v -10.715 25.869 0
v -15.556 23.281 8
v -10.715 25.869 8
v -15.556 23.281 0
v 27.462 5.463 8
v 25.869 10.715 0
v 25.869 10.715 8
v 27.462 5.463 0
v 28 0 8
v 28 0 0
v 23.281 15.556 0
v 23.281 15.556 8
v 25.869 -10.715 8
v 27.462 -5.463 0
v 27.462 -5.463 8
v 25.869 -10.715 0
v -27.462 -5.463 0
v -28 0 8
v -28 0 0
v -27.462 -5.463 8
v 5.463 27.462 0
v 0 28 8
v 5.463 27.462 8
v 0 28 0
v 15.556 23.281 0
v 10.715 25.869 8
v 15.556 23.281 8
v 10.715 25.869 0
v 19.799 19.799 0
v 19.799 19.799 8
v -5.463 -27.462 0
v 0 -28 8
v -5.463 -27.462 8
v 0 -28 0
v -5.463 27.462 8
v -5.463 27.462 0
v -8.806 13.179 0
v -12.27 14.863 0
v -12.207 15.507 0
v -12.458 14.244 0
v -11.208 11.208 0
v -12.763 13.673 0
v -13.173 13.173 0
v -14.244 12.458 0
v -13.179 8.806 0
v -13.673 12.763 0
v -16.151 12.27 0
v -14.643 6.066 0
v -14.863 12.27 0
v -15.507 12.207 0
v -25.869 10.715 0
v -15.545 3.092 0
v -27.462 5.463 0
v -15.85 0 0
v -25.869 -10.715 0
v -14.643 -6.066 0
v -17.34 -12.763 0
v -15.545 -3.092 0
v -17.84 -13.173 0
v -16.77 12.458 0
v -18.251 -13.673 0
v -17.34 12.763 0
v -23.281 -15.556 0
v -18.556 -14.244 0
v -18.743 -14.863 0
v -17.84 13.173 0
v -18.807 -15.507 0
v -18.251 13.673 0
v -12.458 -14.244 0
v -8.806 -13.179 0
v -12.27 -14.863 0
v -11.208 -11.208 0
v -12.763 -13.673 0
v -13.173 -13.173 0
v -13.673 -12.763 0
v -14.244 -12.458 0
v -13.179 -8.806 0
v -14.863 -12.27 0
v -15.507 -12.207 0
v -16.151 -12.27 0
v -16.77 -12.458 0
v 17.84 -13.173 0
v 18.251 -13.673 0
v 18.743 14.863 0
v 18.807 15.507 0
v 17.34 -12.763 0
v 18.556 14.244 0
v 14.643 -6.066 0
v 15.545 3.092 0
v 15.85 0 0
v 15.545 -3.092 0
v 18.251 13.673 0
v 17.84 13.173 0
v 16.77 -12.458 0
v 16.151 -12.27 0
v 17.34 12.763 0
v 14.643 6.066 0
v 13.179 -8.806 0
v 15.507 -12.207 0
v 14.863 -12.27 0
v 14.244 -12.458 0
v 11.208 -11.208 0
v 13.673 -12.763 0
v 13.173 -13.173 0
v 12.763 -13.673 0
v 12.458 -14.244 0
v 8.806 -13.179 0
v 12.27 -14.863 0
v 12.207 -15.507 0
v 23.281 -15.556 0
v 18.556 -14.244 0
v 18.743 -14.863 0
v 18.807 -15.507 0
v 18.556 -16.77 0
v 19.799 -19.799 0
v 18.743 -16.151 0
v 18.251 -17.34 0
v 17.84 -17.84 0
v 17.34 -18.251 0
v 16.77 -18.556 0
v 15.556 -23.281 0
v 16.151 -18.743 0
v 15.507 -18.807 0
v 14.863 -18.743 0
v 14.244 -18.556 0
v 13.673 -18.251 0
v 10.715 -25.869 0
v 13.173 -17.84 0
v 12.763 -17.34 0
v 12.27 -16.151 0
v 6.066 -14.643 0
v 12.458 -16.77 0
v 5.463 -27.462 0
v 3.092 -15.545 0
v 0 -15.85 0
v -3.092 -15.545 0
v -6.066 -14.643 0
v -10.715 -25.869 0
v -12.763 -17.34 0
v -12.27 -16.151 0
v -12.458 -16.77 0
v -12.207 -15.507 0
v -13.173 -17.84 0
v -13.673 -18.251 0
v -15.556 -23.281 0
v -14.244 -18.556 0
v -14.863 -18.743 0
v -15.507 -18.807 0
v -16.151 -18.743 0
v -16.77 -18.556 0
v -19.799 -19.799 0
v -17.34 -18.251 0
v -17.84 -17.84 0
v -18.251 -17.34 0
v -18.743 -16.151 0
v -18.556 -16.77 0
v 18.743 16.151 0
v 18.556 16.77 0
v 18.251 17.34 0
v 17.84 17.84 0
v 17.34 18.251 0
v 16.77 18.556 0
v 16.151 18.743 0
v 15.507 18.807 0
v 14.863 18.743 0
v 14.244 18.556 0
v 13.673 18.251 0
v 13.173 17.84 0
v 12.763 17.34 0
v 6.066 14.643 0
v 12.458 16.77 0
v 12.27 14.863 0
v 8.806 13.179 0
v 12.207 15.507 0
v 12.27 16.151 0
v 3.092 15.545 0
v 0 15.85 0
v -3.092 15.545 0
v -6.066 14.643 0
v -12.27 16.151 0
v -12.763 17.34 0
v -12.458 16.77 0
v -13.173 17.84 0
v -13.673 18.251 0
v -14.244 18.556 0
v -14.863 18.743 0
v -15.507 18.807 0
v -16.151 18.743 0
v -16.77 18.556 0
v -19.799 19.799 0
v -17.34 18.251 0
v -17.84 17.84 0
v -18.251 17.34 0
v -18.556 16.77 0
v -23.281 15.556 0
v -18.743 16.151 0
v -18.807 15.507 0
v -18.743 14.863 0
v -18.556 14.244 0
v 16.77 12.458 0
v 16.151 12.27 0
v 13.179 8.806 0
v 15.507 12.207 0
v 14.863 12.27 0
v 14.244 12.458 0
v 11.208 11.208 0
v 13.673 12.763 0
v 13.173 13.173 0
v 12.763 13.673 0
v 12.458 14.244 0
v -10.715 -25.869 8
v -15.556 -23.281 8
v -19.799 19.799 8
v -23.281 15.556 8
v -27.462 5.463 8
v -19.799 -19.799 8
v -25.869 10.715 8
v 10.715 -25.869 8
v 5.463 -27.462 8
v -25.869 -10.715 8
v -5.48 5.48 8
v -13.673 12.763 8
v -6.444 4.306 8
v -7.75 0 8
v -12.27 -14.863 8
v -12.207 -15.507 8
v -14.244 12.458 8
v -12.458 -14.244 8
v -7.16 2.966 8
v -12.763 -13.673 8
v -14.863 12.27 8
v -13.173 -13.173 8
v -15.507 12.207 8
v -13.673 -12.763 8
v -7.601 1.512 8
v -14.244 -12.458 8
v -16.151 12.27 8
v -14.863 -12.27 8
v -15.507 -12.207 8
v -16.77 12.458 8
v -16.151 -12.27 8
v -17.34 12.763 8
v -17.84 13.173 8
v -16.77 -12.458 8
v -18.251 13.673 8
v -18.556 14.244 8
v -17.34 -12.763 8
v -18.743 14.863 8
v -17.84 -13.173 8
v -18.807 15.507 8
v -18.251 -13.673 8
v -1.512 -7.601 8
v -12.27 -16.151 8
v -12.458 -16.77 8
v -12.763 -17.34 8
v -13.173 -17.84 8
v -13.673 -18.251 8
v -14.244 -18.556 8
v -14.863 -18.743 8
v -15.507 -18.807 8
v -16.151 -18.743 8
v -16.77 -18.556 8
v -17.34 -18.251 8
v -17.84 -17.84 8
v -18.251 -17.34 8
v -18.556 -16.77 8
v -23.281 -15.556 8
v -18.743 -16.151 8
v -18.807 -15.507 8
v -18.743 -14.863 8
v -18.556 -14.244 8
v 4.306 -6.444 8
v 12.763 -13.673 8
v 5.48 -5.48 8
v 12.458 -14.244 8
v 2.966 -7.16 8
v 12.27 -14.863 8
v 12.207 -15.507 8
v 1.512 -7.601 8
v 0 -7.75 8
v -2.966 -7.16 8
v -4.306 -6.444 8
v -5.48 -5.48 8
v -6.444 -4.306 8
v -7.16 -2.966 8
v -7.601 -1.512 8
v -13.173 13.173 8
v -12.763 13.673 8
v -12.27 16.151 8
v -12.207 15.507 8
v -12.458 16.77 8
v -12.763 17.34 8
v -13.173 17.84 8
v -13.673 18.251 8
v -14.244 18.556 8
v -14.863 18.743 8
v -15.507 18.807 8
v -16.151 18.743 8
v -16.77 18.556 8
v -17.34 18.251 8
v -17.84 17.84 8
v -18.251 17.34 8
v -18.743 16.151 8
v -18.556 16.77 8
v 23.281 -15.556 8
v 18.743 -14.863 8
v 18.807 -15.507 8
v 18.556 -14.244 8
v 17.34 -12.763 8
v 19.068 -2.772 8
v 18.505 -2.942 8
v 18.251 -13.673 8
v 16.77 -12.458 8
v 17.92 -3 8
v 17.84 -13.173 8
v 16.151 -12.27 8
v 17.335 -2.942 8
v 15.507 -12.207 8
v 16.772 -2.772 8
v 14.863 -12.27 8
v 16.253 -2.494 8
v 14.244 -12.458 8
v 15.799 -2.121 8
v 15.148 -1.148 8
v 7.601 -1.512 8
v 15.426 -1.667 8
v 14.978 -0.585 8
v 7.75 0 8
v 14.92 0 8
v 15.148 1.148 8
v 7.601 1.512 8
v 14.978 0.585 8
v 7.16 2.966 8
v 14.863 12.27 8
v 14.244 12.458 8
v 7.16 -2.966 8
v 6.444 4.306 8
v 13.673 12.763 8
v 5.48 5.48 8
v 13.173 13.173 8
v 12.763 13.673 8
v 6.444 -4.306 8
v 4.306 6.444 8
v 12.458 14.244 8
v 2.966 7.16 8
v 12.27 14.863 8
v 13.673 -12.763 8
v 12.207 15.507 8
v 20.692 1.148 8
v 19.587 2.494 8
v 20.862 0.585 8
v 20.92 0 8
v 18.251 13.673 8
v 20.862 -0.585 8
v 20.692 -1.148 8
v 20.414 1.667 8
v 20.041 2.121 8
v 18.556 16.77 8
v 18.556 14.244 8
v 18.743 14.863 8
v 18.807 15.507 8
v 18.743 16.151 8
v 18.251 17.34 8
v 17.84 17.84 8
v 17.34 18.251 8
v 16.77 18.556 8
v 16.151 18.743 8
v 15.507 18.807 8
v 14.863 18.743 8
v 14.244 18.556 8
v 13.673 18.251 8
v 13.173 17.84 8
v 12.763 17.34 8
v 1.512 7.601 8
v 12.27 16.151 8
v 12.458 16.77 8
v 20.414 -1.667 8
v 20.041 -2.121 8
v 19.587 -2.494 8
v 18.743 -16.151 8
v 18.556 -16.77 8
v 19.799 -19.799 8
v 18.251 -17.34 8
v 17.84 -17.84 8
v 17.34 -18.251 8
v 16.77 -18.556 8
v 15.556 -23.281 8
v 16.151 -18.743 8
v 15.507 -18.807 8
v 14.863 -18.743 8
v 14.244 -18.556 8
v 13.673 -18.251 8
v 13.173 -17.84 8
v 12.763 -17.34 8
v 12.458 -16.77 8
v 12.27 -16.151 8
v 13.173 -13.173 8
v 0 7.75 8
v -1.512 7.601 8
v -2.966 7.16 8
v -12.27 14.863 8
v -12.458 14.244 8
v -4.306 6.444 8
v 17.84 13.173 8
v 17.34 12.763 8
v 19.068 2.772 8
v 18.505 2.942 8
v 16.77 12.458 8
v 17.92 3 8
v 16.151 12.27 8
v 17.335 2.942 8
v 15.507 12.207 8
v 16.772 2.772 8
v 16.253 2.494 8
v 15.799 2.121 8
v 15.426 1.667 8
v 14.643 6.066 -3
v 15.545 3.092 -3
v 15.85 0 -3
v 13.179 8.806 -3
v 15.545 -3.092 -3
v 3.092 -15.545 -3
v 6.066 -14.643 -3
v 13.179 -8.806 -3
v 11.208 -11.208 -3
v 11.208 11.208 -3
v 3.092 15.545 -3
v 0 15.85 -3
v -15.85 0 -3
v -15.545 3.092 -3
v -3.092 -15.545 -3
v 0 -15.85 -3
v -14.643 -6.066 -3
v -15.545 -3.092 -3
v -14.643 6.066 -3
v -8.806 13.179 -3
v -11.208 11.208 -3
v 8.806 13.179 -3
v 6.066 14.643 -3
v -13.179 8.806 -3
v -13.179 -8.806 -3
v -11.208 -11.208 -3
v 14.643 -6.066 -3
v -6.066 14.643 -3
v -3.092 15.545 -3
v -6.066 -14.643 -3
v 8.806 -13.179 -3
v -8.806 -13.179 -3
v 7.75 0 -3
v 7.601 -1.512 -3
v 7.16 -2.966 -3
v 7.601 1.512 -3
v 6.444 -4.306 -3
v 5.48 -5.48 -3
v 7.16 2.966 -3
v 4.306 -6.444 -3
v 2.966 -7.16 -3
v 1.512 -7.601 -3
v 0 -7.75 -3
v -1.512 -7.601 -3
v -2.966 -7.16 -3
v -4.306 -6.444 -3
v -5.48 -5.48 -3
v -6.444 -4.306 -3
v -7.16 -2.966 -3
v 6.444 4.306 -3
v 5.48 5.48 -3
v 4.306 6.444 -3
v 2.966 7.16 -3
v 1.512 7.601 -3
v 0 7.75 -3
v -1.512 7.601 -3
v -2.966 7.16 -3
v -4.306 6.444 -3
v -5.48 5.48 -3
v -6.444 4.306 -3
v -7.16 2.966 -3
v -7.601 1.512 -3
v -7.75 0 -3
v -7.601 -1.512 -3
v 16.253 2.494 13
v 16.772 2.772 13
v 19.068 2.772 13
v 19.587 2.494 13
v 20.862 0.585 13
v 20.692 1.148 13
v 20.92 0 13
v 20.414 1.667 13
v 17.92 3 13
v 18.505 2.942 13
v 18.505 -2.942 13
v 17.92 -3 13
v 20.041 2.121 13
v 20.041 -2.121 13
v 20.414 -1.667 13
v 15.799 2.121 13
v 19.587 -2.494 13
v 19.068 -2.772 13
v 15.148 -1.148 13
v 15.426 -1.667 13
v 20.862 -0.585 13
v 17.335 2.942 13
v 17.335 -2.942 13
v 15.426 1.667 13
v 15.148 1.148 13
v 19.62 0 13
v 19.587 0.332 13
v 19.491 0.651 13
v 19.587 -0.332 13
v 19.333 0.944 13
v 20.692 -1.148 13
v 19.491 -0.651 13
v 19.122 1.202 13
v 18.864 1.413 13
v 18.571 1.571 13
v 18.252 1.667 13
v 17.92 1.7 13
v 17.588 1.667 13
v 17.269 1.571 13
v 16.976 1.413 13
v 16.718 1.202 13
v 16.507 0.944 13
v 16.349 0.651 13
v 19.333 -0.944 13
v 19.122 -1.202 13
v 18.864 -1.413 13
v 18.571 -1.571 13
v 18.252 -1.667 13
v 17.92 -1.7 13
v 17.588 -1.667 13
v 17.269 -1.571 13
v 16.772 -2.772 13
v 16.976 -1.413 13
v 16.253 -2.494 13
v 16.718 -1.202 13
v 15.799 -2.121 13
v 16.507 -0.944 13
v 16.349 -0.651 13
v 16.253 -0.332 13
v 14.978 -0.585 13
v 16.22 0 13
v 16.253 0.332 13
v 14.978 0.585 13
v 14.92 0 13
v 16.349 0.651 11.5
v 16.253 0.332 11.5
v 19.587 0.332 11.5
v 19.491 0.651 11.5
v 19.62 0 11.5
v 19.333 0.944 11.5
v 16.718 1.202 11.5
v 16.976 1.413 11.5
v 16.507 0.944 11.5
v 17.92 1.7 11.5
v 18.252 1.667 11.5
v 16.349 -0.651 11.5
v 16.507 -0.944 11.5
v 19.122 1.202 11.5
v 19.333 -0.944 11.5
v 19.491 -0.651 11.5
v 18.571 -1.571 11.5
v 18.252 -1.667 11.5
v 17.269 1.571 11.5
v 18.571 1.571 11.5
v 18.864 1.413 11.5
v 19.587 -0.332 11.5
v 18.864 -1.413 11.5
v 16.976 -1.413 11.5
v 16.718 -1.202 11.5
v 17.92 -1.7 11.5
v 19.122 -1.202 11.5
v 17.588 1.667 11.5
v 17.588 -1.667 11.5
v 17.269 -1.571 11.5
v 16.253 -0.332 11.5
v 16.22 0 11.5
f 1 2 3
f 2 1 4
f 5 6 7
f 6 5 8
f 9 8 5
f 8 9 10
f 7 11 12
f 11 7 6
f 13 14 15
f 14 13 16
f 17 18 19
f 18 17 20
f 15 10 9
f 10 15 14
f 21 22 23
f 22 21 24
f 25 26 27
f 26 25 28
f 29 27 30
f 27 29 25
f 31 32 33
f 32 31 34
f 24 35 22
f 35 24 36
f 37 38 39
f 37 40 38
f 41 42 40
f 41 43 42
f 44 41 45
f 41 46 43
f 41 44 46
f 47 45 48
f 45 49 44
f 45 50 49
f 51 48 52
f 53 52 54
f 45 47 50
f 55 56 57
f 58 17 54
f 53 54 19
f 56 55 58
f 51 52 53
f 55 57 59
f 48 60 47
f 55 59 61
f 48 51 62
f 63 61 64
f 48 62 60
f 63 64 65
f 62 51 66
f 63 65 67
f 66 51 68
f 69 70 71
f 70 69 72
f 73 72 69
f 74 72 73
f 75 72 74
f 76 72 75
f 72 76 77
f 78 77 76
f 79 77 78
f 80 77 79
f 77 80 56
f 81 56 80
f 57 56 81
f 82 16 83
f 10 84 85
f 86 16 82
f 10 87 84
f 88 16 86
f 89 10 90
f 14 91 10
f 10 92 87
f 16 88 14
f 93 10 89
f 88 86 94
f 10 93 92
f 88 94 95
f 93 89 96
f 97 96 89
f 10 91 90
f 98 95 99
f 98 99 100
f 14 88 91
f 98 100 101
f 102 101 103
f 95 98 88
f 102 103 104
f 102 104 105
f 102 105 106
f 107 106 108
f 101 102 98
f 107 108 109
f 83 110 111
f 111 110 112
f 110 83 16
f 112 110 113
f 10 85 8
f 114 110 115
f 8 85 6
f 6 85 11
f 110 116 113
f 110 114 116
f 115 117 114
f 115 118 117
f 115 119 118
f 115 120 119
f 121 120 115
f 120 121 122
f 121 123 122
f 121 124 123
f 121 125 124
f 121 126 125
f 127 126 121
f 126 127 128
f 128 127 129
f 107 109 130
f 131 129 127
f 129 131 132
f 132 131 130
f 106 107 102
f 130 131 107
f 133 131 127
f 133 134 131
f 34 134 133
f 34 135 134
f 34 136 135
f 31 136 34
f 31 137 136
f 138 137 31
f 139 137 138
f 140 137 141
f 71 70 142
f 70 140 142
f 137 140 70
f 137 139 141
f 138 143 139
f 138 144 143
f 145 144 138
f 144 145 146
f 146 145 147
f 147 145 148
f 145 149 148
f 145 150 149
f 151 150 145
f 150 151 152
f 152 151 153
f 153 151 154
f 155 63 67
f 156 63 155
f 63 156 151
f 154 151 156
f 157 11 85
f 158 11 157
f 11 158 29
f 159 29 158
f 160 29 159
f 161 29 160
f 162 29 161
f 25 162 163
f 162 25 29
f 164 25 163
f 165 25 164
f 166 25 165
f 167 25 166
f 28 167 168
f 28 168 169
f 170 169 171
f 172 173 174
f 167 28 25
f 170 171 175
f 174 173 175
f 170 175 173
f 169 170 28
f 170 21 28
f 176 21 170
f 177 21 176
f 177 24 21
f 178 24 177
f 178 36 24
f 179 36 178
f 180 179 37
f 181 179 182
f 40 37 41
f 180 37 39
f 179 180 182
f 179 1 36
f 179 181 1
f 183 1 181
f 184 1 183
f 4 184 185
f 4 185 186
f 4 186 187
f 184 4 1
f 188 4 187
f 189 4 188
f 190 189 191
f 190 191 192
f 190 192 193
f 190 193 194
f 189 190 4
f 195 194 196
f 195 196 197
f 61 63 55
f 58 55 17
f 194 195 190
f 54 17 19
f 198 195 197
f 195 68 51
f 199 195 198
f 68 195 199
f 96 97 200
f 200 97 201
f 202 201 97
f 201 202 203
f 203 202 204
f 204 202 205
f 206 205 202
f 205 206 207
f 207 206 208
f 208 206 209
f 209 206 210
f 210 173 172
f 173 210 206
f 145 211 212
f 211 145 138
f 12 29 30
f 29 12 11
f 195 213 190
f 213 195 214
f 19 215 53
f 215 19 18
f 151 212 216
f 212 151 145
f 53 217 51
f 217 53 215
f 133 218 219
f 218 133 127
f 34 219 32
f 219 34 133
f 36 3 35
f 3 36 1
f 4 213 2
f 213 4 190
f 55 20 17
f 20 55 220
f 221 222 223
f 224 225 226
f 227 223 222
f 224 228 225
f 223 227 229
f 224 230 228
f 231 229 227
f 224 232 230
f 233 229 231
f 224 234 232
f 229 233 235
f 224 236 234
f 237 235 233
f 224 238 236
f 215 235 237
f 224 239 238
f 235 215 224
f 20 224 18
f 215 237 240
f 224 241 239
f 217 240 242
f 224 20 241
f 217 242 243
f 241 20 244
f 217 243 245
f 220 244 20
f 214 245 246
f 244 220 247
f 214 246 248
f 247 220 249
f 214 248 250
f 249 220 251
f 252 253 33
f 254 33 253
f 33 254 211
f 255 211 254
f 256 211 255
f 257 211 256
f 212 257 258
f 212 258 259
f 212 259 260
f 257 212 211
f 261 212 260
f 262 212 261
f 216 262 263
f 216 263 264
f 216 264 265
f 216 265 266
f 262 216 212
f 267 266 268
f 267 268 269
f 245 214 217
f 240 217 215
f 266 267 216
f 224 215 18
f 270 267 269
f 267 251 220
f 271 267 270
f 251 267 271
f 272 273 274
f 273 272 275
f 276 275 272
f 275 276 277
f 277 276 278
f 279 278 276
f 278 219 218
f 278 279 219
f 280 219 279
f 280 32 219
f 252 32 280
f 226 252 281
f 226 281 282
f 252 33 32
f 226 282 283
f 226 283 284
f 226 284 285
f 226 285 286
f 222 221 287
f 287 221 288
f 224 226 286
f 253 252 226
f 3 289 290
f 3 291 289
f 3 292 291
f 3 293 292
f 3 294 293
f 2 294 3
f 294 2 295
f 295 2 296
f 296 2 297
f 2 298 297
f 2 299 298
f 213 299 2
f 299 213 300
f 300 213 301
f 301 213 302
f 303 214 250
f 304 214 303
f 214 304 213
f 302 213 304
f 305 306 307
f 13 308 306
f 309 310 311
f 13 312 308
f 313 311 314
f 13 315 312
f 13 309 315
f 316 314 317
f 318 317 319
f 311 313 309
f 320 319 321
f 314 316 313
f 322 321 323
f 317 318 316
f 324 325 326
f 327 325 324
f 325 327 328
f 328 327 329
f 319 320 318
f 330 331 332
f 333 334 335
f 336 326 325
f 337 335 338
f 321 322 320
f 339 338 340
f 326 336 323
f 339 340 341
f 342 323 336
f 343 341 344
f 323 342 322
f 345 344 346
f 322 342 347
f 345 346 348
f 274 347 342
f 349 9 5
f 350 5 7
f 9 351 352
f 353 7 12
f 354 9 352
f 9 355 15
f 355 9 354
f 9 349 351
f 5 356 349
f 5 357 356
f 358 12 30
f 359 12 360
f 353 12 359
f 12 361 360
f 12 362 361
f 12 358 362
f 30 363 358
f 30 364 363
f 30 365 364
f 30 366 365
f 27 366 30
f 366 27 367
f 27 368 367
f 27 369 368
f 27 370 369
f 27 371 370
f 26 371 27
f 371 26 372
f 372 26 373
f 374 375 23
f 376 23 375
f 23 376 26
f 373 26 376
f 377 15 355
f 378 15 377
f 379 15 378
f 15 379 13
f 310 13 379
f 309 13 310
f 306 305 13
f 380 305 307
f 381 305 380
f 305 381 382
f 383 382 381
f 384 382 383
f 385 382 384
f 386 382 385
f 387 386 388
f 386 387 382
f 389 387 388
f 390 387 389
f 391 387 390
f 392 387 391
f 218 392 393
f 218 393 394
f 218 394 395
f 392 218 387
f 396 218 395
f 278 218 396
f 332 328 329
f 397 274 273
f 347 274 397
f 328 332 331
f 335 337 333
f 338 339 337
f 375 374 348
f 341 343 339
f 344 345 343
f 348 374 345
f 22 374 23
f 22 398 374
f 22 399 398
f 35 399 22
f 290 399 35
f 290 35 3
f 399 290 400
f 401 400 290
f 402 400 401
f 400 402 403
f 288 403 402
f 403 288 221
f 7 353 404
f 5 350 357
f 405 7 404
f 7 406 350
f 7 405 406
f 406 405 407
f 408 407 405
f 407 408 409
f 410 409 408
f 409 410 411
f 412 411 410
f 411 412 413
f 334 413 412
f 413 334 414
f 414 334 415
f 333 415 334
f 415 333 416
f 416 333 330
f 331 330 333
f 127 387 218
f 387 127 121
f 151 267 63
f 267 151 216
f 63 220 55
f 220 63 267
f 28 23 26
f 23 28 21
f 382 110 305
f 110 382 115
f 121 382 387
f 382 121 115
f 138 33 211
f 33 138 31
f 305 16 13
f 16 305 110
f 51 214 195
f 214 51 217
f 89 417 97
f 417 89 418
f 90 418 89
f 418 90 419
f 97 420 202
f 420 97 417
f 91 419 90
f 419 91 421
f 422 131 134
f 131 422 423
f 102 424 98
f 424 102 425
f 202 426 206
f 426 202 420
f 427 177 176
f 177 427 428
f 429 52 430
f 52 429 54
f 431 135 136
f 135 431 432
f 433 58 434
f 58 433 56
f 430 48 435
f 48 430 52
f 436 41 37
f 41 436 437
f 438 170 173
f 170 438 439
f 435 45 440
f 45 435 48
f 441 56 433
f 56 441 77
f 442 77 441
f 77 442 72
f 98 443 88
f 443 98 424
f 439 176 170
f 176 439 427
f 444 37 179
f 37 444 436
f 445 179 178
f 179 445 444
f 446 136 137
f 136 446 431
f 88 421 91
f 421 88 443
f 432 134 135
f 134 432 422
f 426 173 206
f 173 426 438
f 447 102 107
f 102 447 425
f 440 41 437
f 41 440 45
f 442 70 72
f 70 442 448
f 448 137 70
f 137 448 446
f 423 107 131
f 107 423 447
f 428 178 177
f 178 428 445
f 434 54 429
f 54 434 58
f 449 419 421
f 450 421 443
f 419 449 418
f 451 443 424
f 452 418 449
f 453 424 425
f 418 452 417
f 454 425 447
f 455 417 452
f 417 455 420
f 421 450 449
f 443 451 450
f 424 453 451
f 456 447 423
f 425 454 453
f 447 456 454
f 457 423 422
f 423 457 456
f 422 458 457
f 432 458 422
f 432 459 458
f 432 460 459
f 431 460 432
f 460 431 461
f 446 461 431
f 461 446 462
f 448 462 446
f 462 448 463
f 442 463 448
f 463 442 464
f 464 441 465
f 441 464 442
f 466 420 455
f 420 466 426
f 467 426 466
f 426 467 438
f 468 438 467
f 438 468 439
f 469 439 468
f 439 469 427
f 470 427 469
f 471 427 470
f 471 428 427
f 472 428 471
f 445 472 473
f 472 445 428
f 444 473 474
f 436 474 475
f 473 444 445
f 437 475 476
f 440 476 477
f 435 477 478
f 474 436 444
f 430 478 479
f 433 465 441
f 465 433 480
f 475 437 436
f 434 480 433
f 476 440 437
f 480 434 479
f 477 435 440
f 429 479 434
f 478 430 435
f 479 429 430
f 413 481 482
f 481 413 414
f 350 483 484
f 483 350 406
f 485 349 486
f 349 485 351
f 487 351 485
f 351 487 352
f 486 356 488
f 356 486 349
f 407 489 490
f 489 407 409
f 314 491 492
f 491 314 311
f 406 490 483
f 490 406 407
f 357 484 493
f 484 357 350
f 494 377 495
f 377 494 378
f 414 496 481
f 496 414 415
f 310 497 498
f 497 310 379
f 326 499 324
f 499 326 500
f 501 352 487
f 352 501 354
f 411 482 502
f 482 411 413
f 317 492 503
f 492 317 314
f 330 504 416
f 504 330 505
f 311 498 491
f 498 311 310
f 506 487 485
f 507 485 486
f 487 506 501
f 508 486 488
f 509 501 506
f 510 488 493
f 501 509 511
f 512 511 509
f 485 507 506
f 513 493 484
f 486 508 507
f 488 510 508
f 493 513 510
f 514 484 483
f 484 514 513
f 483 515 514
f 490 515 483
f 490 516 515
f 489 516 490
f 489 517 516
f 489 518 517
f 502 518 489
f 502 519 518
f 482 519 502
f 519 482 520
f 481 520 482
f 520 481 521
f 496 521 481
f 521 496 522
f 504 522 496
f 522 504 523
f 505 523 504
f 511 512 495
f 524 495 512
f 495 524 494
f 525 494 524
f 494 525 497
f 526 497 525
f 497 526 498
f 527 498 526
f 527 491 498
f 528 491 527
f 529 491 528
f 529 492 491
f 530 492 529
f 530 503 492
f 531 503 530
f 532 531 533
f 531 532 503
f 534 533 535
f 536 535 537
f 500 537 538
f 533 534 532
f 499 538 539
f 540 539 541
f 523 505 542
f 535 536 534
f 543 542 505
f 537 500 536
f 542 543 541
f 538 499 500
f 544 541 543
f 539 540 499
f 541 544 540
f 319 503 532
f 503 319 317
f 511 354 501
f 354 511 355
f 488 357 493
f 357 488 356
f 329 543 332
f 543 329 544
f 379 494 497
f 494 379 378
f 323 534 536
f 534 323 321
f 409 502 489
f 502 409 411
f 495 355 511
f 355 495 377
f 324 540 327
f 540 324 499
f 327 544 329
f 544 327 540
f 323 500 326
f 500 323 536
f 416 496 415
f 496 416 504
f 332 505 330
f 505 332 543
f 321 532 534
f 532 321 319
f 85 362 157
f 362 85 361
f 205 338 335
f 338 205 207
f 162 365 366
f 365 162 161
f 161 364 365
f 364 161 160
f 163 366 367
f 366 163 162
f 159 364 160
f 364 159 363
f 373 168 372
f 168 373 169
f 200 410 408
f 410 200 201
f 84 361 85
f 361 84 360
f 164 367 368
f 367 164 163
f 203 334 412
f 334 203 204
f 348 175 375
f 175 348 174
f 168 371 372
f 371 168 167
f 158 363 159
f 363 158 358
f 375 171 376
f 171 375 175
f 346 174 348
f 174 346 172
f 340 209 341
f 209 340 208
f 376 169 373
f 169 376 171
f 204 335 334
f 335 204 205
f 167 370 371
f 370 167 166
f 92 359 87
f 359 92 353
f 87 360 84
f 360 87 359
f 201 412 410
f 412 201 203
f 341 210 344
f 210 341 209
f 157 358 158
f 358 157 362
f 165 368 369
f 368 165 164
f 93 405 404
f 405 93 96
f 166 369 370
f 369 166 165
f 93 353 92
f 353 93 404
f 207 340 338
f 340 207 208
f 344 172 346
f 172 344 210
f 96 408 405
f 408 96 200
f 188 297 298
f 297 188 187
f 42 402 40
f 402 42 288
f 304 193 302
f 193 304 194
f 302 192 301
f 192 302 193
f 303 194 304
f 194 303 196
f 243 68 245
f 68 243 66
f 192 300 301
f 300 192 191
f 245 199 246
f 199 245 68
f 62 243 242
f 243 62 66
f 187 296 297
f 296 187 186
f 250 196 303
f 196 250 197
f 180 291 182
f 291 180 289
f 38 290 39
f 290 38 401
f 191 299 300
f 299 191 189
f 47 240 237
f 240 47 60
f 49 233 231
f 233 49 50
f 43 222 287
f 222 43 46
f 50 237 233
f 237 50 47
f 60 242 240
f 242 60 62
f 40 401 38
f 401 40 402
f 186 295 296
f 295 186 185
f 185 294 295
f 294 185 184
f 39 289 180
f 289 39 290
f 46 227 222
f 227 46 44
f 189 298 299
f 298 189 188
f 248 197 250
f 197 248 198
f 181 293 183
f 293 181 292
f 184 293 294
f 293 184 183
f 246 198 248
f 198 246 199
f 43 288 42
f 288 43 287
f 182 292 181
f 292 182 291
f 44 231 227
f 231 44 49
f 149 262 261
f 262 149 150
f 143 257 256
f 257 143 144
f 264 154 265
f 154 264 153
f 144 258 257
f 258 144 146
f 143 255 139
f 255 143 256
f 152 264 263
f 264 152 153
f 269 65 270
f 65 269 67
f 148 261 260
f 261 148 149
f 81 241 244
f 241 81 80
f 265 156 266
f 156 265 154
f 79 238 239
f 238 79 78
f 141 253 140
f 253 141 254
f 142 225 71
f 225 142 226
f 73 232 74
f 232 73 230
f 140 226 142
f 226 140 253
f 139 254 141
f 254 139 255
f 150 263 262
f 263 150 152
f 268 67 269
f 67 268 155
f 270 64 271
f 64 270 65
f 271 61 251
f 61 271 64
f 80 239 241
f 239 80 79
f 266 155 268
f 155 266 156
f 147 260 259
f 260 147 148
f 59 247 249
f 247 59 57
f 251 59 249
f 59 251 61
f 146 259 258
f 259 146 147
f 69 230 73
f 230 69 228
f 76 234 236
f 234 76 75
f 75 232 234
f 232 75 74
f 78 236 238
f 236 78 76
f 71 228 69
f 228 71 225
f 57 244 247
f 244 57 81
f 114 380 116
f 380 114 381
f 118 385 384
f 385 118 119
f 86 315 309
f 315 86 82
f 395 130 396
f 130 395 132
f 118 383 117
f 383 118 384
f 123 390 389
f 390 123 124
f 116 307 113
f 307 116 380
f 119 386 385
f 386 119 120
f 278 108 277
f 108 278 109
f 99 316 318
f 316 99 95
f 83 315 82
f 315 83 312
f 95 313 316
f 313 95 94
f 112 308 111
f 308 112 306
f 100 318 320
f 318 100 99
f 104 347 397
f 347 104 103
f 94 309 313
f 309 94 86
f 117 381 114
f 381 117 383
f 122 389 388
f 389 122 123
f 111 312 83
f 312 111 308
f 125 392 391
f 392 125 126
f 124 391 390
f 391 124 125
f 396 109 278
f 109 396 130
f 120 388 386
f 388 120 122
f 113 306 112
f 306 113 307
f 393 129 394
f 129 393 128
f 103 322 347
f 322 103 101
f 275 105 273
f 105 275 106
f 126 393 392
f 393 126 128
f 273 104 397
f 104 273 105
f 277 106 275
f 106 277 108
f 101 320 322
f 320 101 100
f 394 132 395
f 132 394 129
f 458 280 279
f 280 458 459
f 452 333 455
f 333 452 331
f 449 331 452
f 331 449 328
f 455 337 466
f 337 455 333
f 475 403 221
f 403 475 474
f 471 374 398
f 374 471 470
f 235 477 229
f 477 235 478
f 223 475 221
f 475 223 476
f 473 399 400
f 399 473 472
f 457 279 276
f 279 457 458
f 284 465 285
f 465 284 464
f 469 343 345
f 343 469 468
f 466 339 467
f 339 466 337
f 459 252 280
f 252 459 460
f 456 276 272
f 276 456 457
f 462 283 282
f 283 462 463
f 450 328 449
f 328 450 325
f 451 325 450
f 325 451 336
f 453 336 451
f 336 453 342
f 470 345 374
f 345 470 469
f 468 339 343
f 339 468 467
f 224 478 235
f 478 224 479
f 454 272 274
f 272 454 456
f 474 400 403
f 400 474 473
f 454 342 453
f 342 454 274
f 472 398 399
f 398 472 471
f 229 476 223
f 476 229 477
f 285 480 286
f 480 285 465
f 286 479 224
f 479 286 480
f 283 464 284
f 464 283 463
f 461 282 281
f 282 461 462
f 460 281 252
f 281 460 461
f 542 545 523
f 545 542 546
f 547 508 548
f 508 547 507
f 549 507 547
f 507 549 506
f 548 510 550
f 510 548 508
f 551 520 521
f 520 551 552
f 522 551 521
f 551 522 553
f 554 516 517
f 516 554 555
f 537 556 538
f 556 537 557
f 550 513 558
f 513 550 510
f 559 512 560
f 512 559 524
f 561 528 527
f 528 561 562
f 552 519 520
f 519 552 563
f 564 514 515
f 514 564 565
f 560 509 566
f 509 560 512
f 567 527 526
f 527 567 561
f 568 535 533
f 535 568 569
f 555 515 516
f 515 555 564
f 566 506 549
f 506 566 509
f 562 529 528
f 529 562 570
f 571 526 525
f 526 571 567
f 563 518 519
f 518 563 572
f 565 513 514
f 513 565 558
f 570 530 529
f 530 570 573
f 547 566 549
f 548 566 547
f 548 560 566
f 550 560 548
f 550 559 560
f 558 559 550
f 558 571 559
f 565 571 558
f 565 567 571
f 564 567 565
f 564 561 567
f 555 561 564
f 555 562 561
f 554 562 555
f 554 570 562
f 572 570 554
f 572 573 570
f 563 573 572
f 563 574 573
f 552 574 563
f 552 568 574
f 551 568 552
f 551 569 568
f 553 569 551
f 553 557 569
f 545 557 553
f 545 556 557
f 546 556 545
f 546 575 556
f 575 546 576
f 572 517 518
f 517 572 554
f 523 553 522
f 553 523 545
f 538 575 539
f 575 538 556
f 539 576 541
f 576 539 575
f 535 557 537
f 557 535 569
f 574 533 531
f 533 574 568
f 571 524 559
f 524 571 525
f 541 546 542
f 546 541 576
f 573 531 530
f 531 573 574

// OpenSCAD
$fn = 32;

// ----------------------------------------------------------------------
// Retaining cap: 6002 cover, 56 mm, spigot 31.7 mm
// ----------------------------------------------------------------------

// --- parameters (mm) ---
plate_d = 56;             // cover diameter
plate_t = 8;              // cover thickness
boss_d = 31.7;            // spigot that enters the housing
boss_h = 3;               // spigot height
shaft_d = 15.5;           // shaft opening
bolt_d = 6.6;             // bolt clearance
bolt_r = 21.93;           // bolt circle radius
nipple_d = 6;             // grease nipple boss
nipple_h = 5;             // grease nipple boss height

module cover() {
  cylinder(h = plate_t, d = plate_d);
}

module spigot() {
  /* sunk 1 mm into the cover; the spigot sets the overall height */
  translate([0, 0, -boss_h]) cylinder(h = boss_h + 1, d = boss_d);
}

module nipple() {
  translate([plate_d * 0.32, 0, plate_t - 1])
    cylinder(h = nipple_h + 1, d = nipple_d);
}

difference() {
  union() {
    cover();
    spigot();
    nipple();
  }
  for (i = [0 : 3]) rotate([0, 0, 45 + i * 90]) translate([bolt_r, 0, -boss_h - 1])
    cylinder(h = boss_h + plate_t + 2, d = bolt_d);
  translate([0, 0, -boss_h - 1]) cylinder(h = boss_h + plate_t + 2, d = shaft_d);
  translate([plate_d * 0.32, 0, plate_t + nipple_h - 1.5]) cylinder(h = 4, d = 3.4);
}
